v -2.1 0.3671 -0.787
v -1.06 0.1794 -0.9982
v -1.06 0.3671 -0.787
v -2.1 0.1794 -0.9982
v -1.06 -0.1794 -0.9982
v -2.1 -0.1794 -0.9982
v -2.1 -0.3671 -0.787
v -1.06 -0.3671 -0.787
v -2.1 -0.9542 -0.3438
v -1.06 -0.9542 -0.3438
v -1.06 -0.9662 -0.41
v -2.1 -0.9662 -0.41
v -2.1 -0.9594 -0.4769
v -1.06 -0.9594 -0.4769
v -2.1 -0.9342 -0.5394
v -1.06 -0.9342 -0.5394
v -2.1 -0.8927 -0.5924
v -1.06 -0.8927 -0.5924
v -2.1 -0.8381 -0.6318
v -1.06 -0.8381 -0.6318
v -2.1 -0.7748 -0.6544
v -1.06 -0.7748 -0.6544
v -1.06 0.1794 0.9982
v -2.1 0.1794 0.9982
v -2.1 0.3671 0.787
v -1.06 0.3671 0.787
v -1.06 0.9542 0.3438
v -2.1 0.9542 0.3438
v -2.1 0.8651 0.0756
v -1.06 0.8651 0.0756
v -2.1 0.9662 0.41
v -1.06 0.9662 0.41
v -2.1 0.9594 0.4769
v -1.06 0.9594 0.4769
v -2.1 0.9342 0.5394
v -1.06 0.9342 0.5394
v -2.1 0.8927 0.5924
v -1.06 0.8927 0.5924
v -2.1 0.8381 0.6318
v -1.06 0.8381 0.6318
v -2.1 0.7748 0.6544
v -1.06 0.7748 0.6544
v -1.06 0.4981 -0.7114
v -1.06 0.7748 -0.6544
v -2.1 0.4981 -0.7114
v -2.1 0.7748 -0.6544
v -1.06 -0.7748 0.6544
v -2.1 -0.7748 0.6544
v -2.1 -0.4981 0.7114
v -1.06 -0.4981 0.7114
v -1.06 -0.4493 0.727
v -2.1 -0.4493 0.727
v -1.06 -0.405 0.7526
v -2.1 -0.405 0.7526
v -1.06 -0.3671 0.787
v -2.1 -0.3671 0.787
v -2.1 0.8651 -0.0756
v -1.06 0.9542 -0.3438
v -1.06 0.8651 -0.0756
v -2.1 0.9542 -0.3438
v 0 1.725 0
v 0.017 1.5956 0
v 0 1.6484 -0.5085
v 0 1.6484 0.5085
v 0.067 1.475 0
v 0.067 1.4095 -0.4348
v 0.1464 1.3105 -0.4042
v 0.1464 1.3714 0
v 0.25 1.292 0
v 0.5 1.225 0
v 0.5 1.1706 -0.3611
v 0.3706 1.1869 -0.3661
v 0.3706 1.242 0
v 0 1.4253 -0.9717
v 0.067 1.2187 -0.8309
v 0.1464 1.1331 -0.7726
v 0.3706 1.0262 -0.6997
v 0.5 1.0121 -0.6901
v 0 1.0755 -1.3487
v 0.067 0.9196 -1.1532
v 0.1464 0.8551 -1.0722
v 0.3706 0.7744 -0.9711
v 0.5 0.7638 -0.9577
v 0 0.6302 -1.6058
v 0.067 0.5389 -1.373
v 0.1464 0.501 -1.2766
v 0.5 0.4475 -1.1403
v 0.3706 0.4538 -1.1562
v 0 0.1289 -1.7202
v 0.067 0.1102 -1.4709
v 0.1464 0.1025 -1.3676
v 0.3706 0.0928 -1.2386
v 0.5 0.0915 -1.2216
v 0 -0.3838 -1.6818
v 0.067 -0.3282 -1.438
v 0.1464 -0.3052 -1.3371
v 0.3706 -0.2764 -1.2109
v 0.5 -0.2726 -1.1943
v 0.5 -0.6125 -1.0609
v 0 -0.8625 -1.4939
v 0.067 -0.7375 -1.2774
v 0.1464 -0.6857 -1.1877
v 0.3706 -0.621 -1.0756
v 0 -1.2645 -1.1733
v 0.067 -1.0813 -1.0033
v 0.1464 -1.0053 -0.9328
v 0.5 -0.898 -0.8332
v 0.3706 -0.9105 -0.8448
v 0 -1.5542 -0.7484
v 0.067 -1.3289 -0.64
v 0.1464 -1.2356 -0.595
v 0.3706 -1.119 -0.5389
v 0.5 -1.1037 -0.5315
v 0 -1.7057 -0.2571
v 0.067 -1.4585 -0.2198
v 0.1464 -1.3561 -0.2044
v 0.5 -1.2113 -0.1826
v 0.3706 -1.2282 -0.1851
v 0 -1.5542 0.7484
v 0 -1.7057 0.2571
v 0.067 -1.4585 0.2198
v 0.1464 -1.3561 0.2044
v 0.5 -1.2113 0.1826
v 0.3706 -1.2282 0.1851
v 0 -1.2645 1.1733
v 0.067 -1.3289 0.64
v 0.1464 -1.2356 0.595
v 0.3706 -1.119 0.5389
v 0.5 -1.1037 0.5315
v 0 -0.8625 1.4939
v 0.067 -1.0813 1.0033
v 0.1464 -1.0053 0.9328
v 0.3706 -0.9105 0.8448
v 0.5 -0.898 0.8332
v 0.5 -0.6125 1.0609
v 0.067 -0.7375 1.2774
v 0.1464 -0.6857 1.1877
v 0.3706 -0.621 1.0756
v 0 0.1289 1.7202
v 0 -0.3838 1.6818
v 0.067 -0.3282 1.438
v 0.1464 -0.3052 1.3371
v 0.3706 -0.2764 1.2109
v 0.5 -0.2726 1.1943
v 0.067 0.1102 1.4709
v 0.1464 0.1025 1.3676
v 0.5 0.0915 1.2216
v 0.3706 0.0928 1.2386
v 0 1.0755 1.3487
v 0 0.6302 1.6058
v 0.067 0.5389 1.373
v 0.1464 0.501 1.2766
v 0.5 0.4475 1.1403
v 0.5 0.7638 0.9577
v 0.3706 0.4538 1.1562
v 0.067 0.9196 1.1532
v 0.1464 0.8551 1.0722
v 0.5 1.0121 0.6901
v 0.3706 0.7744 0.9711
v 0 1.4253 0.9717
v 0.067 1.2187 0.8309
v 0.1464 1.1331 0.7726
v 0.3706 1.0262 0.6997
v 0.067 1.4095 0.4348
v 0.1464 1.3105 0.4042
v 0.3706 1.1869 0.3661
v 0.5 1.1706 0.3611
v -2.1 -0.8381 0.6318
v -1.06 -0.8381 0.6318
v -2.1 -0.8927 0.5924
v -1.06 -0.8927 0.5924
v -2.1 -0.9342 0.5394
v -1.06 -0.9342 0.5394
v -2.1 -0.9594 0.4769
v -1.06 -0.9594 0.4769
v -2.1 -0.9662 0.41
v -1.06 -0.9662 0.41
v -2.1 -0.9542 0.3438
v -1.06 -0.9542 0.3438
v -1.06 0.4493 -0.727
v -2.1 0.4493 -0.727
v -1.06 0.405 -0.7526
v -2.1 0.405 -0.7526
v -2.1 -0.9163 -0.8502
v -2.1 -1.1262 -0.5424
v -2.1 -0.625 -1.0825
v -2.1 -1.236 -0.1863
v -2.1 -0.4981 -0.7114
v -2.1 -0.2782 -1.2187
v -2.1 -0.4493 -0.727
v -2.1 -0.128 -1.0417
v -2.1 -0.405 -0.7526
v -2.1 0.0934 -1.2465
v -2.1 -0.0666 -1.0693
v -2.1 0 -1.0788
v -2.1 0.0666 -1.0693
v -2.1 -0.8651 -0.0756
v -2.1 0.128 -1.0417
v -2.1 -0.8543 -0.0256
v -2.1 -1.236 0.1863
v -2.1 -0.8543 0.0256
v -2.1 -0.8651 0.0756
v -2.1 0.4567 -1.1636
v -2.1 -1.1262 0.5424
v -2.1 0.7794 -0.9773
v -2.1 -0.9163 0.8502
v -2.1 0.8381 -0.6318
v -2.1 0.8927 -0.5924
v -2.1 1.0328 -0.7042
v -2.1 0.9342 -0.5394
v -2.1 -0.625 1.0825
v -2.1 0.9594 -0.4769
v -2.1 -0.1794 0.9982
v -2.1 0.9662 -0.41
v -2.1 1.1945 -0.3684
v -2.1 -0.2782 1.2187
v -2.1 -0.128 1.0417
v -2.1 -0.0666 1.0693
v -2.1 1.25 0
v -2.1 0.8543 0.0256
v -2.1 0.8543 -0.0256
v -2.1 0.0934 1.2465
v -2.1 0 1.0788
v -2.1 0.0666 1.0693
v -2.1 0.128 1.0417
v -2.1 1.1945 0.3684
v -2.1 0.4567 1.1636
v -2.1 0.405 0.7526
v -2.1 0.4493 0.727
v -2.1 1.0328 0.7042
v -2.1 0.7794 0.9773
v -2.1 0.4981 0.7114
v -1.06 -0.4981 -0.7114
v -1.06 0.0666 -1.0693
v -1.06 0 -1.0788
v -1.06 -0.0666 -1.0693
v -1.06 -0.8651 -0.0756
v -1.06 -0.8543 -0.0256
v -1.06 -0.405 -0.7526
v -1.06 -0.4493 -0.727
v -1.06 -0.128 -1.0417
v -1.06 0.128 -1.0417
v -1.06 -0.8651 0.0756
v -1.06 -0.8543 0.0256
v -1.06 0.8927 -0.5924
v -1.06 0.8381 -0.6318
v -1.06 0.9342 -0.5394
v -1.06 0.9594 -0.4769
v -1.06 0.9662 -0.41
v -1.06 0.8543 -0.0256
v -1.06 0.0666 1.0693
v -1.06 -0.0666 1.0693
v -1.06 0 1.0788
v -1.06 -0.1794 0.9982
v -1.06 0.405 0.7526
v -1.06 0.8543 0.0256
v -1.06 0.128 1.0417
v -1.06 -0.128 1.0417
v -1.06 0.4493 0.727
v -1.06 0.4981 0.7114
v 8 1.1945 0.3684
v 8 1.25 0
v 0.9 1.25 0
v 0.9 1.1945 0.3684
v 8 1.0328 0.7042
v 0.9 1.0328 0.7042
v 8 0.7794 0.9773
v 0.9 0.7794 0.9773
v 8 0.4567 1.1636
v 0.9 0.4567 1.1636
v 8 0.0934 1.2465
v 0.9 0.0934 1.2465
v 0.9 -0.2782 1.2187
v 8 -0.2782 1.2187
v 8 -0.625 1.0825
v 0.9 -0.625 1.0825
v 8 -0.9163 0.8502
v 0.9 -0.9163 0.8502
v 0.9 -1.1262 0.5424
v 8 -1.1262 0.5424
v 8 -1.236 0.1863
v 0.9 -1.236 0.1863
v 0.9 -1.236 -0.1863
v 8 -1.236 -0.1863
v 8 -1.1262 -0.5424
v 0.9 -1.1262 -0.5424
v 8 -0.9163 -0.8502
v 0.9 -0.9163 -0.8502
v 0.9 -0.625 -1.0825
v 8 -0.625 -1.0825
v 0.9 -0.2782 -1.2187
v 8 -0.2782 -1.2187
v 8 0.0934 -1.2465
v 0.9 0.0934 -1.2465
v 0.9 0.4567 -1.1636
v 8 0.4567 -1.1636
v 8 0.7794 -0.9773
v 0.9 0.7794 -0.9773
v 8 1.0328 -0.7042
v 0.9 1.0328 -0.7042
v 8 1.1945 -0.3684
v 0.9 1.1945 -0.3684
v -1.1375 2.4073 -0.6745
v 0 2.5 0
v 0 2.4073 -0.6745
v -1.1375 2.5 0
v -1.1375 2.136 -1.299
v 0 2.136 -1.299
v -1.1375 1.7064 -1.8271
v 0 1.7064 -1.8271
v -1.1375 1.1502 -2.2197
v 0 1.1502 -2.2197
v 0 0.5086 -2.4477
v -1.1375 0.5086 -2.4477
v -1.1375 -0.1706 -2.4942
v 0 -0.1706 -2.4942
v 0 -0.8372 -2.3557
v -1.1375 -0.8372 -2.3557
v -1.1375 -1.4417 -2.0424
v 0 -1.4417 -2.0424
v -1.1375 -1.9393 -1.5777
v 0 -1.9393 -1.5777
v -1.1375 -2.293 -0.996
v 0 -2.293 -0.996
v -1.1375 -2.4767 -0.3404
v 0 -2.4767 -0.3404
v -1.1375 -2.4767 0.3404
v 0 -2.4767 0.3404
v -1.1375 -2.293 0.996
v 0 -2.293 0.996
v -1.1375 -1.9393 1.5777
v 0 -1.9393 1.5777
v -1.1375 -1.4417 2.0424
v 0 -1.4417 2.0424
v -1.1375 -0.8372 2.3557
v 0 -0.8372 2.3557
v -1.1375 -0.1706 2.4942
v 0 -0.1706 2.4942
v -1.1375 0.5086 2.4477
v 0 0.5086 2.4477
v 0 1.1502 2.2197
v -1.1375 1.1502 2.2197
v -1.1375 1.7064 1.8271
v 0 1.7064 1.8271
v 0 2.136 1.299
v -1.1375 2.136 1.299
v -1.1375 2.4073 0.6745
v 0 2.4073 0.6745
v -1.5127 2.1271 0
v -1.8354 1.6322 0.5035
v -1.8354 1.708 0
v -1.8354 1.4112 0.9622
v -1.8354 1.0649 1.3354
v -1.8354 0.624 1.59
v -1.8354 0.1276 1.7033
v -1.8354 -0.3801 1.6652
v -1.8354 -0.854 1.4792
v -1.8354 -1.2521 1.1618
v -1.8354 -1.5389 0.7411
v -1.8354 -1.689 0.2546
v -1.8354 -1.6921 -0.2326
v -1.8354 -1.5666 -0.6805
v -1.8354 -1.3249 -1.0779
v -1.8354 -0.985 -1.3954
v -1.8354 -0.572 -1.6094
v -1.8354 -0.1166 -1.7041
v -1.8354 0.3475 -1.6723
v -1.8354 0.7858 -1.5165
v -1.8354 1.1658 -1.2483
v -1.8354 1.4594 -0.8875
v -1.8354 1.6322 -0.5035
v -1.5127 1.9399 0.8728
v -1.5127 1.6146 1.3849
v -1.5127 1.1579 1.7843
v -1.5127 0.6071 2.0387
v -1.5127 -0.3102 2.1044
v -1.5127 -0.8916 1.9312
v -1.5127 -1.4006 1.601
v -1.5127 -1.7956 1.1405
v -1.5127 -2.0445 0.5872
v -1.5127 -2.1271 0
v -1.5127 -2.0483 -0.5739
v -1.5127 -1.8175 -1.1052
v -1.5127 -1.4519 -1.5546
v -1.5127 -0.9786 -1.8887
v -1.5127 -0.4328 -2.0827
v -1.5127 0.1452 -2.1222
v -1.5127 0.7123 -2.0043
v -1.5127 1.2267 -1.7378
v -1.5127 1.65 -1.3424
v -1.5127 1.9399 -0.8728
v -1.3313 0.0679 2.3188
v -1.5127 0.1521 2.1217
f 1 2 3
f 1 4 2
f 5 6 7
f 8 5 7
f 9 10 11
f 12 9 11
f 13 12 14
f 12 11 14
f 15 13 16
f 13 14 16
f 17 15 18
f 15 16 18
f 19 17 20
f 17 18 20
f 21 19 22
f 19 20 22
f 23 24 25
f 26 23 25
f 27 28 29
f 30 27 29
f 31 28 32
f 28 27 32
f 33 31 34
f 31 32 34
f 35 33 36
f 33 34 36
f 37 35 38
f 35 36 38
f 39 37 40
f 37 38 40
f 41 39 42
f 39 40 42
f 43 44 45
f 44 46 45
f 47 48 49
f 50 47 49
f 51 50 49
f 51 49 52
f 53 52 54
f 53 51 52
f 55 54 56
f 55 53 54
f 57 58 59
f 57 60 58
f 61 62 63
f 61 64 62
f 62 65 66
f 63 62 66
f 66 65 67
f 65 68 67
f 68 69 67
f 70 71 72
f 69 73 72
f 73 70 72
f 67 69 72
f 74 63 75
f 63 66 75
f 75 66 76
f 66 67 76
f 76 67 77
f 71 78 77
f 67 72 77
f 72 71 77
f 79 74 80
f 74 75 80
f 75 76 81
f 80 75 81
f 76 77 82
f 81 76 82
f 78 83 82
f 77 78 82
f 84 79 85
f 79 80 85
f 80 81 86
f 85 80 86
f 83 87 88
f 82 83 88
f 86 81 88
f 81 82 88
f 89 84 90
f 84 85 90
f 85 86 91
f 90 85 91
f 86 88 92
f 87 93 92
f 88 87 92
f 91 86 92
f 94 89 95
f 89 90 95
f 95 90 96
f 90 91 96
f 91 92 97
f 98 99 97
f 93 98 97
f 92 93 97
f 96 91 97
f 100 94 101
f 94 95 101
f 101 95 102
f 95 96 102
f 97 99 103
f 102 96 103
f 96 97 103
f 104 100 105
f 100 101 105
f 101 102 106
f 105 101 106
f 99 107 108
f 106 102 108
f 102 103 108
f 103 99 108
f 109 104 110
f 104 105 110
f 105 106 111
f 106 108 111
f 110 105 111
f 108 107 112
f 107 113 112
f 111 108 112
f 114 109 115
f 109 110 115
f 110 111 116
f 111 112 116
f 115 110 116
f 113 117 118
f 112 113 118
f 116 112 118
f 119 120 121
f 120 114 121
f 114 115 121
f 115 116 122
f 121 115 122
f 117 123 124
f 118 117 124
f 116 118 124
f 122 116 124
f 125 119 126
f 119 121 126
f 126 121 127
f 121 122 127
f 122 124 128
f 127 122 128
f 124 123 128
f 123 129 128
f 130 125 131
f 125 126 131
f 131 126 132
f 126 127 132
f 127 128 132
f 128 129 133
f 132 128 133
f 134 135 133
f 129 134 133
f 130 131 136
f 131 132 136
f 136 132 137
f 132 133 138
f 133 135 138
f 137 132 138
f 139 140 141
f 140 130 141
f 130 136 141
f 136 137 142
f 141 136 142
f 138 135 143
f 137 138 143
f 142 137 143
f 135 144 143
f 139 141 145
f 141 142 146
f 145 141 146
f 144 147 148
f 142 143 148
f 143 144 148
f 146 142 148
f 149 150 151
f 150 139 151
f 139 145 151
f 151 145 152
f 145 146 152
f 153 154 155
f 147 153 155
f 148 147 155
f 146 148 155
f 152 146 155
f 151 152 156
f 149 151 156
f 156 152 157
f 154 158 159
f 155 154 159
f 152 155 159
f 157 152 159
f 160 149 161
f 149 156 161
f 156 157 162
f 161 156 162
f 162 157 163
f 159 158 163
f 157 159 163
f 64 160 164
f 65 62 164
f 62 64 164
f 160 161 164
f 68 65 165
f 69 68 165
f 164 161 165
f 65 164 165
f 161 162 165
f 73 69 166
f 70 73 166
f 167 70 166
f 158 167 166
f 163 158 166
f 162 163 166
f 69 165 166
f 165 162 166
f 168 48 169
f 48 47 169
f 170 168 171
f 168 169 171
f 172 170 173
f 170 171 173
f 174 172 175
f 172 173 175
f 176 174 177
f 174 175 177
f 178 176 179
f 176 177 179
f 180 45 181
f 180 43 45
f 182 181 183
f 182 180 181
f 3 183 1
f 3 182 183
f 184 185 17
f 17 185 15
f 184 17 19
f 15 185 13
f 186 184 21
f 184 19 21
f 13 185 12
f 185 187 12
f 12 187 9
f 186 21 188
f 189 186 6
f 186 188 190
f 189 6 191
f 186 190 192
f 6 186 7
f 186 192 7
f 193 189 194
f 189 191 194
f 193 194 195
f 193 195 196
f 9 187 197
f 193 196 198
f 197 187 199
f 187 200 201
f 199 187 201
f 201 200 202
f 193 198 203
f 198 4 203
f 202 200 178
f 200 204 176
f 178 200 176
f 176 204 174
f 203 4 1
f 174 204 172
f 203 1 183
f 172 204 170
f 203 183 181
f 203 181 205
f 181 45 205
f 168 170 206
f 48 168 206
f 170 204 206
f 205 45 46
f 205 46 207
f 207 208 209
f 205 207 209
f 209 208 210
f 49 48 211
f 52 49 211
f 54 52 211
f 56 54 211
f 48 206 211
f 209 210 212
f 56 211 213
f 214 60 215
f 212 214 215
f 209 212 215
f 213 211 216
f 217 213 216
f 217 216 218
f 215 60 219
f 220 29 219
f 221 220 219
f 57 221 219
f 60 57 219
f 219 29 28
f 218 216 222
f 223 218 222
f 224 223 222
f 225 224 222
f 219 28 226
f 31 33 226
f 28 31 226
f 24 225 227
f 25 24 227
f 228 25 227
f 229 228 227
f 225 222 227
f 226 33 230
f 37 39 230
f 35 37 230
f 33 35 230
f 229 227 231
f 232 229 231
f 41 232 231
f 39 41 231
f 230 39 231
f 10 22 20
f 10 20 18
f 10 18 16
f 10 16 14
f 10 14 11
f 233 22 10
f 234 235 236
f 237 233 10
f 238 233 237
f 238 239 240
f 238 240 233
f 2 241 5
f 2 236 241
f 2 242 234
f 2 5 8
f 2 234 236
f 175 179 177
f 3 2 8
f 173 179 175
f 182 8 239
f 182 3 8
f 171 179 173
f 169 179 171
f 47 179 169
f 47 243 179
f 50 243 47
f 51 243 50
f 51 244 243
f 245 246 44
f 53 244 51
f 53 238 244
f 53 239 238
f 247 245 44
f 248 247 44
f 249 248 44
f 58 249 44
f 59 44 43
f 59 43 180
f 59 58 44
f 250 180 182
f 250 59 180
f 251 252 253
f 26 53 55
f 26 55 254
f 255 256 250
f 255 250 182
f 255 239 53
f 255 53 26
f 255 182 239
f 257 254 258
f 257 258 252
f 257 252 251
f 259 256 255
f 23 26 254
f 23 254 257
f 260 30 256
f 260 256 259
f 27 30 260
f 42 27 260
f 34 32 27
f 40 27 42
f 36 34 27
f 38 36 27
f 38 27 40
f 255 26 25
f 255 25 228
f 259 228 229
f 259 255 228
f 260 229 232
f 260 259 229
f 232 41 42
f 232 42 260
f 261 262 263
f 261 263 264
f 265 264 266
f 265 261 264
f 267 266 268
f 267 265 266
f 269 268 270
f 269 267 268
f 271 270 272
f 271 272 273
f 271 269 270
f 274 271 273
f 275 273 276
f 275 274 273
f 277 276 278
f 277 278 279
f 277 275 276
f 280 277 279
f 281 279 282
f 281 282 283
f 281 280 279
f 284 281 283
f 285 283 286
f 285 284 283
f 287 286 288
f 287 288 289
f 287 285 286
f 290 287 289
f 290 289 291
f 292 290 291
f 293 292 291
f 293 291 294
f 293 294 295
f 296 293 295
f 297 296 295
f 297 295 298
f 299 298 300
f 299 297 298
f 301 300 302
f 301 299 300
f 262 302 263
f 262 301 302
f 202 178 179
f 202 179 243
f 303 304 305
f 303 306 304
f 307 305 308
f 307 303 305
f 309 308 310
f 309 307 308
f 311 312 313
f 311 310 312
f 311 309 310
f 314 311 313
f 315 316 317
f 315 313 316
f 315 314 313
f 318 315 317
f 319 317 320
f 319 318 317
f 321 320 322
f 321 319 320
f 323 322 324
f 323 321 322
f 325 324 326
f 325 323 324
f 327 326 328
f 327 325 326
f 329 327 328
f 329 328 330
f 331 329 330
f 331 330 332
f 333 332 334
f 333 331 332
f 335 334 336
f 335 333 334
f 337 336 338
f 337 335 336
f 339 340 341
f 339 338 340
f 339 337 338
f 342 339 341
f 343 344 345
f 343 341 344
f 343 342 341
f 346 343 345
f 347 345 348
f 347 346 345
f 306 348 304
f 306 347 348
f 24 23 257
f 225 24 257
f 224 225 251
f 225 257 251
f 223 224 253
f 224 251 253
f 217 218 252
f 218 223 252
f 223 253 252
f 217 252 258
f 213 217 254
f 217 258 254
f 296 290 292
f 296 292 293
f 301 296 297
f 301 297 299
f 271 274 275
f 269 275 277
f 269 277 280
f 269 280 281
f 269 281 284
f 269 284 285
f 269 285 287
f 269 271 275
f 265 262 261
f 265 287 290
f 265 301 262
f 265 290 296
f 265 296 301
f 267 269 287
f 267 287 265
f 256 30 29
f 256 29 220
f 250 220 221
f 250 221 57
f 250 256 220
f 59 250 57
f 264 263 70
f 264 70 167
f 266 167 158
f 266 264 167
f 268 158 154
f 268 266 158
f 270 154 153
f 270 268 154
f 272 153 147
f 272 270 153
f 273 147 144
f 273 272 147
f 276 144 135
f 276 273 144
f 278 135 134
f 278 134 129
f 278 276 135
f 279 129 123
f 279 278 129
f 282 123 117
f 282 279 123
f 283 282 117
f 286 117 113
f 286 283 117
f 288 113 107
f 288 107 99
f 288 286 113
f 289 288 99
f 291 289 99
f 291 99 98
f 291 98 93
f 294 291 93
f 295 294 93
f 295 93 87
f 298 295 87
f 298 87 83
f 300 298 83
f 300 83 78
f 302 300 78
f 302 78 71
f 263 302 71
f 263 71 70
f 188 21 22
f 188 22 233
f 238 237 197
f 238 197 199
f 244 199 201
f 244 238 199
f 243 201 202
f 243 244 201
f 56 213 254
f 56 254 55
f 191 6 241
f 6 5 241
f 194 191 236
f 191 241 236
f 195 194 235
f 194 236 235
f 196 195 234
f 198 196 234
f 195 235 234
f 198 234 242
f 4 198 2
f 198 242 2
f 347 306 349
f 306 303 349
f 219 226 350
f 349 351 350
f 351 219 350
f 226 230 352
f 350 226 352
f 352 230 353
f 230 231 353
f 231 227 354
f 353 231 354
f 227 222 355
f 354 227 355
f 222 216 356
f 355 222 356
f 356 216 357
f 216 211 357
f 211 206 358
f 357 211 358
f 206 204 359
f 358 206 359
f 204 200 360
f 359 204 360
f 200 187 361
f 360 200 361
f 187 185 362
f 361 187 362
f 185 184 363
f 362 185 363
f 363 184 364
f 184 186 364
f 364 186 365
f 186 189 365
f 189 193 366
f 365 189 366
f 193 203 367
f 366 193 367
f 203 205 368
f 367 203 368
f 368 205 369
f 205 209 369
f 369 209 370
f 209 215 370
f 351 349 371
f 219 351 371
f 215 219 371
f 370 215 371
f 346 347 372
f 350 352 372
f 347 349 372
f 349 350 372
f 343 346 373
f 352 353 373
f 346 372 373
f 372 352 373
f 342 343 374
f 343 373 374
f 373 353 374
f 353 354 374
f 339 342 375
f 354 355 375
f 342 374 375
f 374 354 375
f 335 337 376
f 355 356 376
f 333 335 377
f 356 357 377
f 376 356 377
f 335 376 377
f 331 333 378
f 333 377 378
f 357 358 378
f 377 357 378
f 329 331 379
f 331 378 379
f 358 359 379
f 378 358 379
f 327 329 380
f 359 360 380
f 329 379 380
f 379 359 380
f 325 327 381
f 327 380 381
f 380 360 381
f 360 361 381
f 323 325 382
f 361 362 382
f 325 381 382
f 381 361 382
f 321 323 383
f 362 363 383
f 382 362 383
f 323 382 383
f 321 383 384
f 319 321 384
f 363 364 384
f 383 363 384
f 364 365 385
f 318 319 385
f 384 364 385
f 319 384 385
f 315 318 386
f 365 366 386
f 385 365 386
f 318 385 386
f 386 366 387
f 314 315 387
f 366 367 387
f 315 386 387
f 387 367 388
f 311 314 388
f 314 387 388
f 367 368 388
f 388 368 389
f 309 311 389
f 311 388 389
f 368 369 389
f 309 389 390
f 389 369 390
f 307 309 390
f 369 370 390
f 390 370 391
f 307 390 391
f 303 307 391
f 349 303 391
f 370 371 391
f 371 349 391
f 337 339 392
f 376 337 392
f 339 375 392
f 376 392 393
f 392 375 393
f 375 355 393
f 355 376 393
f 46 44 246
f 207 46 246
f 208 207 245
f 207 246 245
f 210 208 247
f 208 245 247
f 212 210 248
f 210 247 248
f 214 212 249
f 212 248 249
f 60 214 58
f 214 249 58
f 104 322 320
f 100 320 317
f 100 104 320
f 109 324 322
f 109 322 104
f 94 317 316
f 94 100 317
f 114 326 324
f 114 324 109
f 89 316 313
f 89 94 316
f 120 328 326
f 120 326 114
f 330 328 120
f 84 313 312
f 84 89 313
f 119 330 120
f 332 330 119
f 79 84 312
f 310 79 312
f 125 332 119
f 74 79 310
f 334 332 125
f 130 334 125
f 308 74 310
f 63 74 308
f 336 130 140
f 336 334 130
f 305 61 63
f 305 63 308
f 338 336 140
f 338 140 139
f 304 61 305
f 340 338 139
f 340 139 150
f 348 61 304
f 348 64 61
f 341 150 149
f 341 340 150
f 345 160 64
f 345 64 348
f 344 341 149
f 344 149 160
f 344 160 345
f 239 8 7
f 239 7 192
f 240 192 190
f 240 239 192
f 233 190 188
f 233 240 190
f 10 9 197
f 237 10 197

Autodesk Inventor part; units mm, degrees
ref_plane "YZ Plane" through (0, 0, 0) normal (1, 0, 0) x (0, 1, 0)
ref_plane "XZ Plane" through (0, 0, 0) normal (0, 1, 0) x (-1, 0, 0)
ref_plane "XY Plane" through (0, 0, 0) normal (0, 0, 1) x (1, 0, 0)
sketch "Sketch4" plane through (0, 0, 0) normal (0, 0, 1) x (1, 0, 0)
  line L0 (-2.1, 0) -> (8, 0)
  line L1 (0, 0) -> (-2.1, 0)
  line L2 (0, 2.5) -> (0, 1.725)
  line L3 (0.5, 1.225) -> (0.5, 1.225)
  line L4 (0.5, 1.225) -> (0.9, 1.25)
  arc A0 (0, 1.725) -> (0.5, 1.225) centre (0.5, 1.725) ccw
  line L5 (-2.1, 0) -> (-2.1, 1.25)
  line L6 (0, 2.5) -> (-1.1375, 2.5)
  arc A1 (-1.1375, 2.5) -> (-2.1, 1.25) centre (1.4883, -0.5175) ccw
  line L7 (0.9, 1.25) -> (8, 1.25)
  line L8 (8, 1.25) -> (8, 0)
  point P0 (0, 1.225)
  dimension "d71" = 0.5
  dimension "d72" = 8
  dimension "d74" = 0.4
  dimension "d75" = 2.45
  dimension "d78" = 2.5
  dimension "d82" = 4
  dimension "d83" = 2.1
  dimension "d84" = 5
  dimension "d104" = 7.1
  dimension "d105" = 2.5
revolve "Revolution7" add sketch "Sketch4" angle 360 about axis through (-2.1, 0, 0) along (1, 0, 0)
sketch "Sketch5" plane through (-2.1, 0, 0) normal (-1, 0, 0) x (0, 0, 1)
  circle A0 centre (0, 0) radius 1.2 construction
  circle A1 centre (0, 0) radius 0.84 construction
  line L0 (0, 0) -> (-0.7275, 0.42)
  line L1 (0, 0) -> (-0.7275, -0.42)
  line L2 (-1.8008, 0) -> (1.7887, 0)
  line L3 (-1.2, 0) -> (-0.7275, -0.42)
  line L4 (-1.2, 0) -> (-0.7275, 0.42)
  dimension "d88" = 2.4
  dimension "d89" = 1.68
  dimension "d90" = 30
  dimension "d91" = 30
extrude "Extrusion1" cut sketch "Sketch5" against normal blind 1.04
pattern_circular "Circular Pattern1" count 6 over 360 about axis through (-10, 0, 0) along (1, 0, 0) of "Extrusion1"
fillet "Fillet1" radius 0.24 12 edges at (-1.58, -1.0392, -0.6) (-1.58, -0.42, -0.7275) (-1.58, -0.84, 0) (-1.58, -1.0392, 0.6) (-1.58, -0.42, 0.7275) (-1.58, 0, 1.2) (-1.58, 0.84, 0) (-1.58, 1.0392, 0.6) (-1.58, 0.42, 0.7275) (-1.58, 0.42, -0.7275) (-1.58, 0, -1.2) (-1.58, 1.0392, -0.6)
thread "Thread7" size "M2.5x0.45" class "6g" standard "ISO Metric profile" length 7.1
properties part number "Flachkopfschraube mit Innenrund ISO 14583 - M2,5 x 8 - 4.8" material "Stahl"
